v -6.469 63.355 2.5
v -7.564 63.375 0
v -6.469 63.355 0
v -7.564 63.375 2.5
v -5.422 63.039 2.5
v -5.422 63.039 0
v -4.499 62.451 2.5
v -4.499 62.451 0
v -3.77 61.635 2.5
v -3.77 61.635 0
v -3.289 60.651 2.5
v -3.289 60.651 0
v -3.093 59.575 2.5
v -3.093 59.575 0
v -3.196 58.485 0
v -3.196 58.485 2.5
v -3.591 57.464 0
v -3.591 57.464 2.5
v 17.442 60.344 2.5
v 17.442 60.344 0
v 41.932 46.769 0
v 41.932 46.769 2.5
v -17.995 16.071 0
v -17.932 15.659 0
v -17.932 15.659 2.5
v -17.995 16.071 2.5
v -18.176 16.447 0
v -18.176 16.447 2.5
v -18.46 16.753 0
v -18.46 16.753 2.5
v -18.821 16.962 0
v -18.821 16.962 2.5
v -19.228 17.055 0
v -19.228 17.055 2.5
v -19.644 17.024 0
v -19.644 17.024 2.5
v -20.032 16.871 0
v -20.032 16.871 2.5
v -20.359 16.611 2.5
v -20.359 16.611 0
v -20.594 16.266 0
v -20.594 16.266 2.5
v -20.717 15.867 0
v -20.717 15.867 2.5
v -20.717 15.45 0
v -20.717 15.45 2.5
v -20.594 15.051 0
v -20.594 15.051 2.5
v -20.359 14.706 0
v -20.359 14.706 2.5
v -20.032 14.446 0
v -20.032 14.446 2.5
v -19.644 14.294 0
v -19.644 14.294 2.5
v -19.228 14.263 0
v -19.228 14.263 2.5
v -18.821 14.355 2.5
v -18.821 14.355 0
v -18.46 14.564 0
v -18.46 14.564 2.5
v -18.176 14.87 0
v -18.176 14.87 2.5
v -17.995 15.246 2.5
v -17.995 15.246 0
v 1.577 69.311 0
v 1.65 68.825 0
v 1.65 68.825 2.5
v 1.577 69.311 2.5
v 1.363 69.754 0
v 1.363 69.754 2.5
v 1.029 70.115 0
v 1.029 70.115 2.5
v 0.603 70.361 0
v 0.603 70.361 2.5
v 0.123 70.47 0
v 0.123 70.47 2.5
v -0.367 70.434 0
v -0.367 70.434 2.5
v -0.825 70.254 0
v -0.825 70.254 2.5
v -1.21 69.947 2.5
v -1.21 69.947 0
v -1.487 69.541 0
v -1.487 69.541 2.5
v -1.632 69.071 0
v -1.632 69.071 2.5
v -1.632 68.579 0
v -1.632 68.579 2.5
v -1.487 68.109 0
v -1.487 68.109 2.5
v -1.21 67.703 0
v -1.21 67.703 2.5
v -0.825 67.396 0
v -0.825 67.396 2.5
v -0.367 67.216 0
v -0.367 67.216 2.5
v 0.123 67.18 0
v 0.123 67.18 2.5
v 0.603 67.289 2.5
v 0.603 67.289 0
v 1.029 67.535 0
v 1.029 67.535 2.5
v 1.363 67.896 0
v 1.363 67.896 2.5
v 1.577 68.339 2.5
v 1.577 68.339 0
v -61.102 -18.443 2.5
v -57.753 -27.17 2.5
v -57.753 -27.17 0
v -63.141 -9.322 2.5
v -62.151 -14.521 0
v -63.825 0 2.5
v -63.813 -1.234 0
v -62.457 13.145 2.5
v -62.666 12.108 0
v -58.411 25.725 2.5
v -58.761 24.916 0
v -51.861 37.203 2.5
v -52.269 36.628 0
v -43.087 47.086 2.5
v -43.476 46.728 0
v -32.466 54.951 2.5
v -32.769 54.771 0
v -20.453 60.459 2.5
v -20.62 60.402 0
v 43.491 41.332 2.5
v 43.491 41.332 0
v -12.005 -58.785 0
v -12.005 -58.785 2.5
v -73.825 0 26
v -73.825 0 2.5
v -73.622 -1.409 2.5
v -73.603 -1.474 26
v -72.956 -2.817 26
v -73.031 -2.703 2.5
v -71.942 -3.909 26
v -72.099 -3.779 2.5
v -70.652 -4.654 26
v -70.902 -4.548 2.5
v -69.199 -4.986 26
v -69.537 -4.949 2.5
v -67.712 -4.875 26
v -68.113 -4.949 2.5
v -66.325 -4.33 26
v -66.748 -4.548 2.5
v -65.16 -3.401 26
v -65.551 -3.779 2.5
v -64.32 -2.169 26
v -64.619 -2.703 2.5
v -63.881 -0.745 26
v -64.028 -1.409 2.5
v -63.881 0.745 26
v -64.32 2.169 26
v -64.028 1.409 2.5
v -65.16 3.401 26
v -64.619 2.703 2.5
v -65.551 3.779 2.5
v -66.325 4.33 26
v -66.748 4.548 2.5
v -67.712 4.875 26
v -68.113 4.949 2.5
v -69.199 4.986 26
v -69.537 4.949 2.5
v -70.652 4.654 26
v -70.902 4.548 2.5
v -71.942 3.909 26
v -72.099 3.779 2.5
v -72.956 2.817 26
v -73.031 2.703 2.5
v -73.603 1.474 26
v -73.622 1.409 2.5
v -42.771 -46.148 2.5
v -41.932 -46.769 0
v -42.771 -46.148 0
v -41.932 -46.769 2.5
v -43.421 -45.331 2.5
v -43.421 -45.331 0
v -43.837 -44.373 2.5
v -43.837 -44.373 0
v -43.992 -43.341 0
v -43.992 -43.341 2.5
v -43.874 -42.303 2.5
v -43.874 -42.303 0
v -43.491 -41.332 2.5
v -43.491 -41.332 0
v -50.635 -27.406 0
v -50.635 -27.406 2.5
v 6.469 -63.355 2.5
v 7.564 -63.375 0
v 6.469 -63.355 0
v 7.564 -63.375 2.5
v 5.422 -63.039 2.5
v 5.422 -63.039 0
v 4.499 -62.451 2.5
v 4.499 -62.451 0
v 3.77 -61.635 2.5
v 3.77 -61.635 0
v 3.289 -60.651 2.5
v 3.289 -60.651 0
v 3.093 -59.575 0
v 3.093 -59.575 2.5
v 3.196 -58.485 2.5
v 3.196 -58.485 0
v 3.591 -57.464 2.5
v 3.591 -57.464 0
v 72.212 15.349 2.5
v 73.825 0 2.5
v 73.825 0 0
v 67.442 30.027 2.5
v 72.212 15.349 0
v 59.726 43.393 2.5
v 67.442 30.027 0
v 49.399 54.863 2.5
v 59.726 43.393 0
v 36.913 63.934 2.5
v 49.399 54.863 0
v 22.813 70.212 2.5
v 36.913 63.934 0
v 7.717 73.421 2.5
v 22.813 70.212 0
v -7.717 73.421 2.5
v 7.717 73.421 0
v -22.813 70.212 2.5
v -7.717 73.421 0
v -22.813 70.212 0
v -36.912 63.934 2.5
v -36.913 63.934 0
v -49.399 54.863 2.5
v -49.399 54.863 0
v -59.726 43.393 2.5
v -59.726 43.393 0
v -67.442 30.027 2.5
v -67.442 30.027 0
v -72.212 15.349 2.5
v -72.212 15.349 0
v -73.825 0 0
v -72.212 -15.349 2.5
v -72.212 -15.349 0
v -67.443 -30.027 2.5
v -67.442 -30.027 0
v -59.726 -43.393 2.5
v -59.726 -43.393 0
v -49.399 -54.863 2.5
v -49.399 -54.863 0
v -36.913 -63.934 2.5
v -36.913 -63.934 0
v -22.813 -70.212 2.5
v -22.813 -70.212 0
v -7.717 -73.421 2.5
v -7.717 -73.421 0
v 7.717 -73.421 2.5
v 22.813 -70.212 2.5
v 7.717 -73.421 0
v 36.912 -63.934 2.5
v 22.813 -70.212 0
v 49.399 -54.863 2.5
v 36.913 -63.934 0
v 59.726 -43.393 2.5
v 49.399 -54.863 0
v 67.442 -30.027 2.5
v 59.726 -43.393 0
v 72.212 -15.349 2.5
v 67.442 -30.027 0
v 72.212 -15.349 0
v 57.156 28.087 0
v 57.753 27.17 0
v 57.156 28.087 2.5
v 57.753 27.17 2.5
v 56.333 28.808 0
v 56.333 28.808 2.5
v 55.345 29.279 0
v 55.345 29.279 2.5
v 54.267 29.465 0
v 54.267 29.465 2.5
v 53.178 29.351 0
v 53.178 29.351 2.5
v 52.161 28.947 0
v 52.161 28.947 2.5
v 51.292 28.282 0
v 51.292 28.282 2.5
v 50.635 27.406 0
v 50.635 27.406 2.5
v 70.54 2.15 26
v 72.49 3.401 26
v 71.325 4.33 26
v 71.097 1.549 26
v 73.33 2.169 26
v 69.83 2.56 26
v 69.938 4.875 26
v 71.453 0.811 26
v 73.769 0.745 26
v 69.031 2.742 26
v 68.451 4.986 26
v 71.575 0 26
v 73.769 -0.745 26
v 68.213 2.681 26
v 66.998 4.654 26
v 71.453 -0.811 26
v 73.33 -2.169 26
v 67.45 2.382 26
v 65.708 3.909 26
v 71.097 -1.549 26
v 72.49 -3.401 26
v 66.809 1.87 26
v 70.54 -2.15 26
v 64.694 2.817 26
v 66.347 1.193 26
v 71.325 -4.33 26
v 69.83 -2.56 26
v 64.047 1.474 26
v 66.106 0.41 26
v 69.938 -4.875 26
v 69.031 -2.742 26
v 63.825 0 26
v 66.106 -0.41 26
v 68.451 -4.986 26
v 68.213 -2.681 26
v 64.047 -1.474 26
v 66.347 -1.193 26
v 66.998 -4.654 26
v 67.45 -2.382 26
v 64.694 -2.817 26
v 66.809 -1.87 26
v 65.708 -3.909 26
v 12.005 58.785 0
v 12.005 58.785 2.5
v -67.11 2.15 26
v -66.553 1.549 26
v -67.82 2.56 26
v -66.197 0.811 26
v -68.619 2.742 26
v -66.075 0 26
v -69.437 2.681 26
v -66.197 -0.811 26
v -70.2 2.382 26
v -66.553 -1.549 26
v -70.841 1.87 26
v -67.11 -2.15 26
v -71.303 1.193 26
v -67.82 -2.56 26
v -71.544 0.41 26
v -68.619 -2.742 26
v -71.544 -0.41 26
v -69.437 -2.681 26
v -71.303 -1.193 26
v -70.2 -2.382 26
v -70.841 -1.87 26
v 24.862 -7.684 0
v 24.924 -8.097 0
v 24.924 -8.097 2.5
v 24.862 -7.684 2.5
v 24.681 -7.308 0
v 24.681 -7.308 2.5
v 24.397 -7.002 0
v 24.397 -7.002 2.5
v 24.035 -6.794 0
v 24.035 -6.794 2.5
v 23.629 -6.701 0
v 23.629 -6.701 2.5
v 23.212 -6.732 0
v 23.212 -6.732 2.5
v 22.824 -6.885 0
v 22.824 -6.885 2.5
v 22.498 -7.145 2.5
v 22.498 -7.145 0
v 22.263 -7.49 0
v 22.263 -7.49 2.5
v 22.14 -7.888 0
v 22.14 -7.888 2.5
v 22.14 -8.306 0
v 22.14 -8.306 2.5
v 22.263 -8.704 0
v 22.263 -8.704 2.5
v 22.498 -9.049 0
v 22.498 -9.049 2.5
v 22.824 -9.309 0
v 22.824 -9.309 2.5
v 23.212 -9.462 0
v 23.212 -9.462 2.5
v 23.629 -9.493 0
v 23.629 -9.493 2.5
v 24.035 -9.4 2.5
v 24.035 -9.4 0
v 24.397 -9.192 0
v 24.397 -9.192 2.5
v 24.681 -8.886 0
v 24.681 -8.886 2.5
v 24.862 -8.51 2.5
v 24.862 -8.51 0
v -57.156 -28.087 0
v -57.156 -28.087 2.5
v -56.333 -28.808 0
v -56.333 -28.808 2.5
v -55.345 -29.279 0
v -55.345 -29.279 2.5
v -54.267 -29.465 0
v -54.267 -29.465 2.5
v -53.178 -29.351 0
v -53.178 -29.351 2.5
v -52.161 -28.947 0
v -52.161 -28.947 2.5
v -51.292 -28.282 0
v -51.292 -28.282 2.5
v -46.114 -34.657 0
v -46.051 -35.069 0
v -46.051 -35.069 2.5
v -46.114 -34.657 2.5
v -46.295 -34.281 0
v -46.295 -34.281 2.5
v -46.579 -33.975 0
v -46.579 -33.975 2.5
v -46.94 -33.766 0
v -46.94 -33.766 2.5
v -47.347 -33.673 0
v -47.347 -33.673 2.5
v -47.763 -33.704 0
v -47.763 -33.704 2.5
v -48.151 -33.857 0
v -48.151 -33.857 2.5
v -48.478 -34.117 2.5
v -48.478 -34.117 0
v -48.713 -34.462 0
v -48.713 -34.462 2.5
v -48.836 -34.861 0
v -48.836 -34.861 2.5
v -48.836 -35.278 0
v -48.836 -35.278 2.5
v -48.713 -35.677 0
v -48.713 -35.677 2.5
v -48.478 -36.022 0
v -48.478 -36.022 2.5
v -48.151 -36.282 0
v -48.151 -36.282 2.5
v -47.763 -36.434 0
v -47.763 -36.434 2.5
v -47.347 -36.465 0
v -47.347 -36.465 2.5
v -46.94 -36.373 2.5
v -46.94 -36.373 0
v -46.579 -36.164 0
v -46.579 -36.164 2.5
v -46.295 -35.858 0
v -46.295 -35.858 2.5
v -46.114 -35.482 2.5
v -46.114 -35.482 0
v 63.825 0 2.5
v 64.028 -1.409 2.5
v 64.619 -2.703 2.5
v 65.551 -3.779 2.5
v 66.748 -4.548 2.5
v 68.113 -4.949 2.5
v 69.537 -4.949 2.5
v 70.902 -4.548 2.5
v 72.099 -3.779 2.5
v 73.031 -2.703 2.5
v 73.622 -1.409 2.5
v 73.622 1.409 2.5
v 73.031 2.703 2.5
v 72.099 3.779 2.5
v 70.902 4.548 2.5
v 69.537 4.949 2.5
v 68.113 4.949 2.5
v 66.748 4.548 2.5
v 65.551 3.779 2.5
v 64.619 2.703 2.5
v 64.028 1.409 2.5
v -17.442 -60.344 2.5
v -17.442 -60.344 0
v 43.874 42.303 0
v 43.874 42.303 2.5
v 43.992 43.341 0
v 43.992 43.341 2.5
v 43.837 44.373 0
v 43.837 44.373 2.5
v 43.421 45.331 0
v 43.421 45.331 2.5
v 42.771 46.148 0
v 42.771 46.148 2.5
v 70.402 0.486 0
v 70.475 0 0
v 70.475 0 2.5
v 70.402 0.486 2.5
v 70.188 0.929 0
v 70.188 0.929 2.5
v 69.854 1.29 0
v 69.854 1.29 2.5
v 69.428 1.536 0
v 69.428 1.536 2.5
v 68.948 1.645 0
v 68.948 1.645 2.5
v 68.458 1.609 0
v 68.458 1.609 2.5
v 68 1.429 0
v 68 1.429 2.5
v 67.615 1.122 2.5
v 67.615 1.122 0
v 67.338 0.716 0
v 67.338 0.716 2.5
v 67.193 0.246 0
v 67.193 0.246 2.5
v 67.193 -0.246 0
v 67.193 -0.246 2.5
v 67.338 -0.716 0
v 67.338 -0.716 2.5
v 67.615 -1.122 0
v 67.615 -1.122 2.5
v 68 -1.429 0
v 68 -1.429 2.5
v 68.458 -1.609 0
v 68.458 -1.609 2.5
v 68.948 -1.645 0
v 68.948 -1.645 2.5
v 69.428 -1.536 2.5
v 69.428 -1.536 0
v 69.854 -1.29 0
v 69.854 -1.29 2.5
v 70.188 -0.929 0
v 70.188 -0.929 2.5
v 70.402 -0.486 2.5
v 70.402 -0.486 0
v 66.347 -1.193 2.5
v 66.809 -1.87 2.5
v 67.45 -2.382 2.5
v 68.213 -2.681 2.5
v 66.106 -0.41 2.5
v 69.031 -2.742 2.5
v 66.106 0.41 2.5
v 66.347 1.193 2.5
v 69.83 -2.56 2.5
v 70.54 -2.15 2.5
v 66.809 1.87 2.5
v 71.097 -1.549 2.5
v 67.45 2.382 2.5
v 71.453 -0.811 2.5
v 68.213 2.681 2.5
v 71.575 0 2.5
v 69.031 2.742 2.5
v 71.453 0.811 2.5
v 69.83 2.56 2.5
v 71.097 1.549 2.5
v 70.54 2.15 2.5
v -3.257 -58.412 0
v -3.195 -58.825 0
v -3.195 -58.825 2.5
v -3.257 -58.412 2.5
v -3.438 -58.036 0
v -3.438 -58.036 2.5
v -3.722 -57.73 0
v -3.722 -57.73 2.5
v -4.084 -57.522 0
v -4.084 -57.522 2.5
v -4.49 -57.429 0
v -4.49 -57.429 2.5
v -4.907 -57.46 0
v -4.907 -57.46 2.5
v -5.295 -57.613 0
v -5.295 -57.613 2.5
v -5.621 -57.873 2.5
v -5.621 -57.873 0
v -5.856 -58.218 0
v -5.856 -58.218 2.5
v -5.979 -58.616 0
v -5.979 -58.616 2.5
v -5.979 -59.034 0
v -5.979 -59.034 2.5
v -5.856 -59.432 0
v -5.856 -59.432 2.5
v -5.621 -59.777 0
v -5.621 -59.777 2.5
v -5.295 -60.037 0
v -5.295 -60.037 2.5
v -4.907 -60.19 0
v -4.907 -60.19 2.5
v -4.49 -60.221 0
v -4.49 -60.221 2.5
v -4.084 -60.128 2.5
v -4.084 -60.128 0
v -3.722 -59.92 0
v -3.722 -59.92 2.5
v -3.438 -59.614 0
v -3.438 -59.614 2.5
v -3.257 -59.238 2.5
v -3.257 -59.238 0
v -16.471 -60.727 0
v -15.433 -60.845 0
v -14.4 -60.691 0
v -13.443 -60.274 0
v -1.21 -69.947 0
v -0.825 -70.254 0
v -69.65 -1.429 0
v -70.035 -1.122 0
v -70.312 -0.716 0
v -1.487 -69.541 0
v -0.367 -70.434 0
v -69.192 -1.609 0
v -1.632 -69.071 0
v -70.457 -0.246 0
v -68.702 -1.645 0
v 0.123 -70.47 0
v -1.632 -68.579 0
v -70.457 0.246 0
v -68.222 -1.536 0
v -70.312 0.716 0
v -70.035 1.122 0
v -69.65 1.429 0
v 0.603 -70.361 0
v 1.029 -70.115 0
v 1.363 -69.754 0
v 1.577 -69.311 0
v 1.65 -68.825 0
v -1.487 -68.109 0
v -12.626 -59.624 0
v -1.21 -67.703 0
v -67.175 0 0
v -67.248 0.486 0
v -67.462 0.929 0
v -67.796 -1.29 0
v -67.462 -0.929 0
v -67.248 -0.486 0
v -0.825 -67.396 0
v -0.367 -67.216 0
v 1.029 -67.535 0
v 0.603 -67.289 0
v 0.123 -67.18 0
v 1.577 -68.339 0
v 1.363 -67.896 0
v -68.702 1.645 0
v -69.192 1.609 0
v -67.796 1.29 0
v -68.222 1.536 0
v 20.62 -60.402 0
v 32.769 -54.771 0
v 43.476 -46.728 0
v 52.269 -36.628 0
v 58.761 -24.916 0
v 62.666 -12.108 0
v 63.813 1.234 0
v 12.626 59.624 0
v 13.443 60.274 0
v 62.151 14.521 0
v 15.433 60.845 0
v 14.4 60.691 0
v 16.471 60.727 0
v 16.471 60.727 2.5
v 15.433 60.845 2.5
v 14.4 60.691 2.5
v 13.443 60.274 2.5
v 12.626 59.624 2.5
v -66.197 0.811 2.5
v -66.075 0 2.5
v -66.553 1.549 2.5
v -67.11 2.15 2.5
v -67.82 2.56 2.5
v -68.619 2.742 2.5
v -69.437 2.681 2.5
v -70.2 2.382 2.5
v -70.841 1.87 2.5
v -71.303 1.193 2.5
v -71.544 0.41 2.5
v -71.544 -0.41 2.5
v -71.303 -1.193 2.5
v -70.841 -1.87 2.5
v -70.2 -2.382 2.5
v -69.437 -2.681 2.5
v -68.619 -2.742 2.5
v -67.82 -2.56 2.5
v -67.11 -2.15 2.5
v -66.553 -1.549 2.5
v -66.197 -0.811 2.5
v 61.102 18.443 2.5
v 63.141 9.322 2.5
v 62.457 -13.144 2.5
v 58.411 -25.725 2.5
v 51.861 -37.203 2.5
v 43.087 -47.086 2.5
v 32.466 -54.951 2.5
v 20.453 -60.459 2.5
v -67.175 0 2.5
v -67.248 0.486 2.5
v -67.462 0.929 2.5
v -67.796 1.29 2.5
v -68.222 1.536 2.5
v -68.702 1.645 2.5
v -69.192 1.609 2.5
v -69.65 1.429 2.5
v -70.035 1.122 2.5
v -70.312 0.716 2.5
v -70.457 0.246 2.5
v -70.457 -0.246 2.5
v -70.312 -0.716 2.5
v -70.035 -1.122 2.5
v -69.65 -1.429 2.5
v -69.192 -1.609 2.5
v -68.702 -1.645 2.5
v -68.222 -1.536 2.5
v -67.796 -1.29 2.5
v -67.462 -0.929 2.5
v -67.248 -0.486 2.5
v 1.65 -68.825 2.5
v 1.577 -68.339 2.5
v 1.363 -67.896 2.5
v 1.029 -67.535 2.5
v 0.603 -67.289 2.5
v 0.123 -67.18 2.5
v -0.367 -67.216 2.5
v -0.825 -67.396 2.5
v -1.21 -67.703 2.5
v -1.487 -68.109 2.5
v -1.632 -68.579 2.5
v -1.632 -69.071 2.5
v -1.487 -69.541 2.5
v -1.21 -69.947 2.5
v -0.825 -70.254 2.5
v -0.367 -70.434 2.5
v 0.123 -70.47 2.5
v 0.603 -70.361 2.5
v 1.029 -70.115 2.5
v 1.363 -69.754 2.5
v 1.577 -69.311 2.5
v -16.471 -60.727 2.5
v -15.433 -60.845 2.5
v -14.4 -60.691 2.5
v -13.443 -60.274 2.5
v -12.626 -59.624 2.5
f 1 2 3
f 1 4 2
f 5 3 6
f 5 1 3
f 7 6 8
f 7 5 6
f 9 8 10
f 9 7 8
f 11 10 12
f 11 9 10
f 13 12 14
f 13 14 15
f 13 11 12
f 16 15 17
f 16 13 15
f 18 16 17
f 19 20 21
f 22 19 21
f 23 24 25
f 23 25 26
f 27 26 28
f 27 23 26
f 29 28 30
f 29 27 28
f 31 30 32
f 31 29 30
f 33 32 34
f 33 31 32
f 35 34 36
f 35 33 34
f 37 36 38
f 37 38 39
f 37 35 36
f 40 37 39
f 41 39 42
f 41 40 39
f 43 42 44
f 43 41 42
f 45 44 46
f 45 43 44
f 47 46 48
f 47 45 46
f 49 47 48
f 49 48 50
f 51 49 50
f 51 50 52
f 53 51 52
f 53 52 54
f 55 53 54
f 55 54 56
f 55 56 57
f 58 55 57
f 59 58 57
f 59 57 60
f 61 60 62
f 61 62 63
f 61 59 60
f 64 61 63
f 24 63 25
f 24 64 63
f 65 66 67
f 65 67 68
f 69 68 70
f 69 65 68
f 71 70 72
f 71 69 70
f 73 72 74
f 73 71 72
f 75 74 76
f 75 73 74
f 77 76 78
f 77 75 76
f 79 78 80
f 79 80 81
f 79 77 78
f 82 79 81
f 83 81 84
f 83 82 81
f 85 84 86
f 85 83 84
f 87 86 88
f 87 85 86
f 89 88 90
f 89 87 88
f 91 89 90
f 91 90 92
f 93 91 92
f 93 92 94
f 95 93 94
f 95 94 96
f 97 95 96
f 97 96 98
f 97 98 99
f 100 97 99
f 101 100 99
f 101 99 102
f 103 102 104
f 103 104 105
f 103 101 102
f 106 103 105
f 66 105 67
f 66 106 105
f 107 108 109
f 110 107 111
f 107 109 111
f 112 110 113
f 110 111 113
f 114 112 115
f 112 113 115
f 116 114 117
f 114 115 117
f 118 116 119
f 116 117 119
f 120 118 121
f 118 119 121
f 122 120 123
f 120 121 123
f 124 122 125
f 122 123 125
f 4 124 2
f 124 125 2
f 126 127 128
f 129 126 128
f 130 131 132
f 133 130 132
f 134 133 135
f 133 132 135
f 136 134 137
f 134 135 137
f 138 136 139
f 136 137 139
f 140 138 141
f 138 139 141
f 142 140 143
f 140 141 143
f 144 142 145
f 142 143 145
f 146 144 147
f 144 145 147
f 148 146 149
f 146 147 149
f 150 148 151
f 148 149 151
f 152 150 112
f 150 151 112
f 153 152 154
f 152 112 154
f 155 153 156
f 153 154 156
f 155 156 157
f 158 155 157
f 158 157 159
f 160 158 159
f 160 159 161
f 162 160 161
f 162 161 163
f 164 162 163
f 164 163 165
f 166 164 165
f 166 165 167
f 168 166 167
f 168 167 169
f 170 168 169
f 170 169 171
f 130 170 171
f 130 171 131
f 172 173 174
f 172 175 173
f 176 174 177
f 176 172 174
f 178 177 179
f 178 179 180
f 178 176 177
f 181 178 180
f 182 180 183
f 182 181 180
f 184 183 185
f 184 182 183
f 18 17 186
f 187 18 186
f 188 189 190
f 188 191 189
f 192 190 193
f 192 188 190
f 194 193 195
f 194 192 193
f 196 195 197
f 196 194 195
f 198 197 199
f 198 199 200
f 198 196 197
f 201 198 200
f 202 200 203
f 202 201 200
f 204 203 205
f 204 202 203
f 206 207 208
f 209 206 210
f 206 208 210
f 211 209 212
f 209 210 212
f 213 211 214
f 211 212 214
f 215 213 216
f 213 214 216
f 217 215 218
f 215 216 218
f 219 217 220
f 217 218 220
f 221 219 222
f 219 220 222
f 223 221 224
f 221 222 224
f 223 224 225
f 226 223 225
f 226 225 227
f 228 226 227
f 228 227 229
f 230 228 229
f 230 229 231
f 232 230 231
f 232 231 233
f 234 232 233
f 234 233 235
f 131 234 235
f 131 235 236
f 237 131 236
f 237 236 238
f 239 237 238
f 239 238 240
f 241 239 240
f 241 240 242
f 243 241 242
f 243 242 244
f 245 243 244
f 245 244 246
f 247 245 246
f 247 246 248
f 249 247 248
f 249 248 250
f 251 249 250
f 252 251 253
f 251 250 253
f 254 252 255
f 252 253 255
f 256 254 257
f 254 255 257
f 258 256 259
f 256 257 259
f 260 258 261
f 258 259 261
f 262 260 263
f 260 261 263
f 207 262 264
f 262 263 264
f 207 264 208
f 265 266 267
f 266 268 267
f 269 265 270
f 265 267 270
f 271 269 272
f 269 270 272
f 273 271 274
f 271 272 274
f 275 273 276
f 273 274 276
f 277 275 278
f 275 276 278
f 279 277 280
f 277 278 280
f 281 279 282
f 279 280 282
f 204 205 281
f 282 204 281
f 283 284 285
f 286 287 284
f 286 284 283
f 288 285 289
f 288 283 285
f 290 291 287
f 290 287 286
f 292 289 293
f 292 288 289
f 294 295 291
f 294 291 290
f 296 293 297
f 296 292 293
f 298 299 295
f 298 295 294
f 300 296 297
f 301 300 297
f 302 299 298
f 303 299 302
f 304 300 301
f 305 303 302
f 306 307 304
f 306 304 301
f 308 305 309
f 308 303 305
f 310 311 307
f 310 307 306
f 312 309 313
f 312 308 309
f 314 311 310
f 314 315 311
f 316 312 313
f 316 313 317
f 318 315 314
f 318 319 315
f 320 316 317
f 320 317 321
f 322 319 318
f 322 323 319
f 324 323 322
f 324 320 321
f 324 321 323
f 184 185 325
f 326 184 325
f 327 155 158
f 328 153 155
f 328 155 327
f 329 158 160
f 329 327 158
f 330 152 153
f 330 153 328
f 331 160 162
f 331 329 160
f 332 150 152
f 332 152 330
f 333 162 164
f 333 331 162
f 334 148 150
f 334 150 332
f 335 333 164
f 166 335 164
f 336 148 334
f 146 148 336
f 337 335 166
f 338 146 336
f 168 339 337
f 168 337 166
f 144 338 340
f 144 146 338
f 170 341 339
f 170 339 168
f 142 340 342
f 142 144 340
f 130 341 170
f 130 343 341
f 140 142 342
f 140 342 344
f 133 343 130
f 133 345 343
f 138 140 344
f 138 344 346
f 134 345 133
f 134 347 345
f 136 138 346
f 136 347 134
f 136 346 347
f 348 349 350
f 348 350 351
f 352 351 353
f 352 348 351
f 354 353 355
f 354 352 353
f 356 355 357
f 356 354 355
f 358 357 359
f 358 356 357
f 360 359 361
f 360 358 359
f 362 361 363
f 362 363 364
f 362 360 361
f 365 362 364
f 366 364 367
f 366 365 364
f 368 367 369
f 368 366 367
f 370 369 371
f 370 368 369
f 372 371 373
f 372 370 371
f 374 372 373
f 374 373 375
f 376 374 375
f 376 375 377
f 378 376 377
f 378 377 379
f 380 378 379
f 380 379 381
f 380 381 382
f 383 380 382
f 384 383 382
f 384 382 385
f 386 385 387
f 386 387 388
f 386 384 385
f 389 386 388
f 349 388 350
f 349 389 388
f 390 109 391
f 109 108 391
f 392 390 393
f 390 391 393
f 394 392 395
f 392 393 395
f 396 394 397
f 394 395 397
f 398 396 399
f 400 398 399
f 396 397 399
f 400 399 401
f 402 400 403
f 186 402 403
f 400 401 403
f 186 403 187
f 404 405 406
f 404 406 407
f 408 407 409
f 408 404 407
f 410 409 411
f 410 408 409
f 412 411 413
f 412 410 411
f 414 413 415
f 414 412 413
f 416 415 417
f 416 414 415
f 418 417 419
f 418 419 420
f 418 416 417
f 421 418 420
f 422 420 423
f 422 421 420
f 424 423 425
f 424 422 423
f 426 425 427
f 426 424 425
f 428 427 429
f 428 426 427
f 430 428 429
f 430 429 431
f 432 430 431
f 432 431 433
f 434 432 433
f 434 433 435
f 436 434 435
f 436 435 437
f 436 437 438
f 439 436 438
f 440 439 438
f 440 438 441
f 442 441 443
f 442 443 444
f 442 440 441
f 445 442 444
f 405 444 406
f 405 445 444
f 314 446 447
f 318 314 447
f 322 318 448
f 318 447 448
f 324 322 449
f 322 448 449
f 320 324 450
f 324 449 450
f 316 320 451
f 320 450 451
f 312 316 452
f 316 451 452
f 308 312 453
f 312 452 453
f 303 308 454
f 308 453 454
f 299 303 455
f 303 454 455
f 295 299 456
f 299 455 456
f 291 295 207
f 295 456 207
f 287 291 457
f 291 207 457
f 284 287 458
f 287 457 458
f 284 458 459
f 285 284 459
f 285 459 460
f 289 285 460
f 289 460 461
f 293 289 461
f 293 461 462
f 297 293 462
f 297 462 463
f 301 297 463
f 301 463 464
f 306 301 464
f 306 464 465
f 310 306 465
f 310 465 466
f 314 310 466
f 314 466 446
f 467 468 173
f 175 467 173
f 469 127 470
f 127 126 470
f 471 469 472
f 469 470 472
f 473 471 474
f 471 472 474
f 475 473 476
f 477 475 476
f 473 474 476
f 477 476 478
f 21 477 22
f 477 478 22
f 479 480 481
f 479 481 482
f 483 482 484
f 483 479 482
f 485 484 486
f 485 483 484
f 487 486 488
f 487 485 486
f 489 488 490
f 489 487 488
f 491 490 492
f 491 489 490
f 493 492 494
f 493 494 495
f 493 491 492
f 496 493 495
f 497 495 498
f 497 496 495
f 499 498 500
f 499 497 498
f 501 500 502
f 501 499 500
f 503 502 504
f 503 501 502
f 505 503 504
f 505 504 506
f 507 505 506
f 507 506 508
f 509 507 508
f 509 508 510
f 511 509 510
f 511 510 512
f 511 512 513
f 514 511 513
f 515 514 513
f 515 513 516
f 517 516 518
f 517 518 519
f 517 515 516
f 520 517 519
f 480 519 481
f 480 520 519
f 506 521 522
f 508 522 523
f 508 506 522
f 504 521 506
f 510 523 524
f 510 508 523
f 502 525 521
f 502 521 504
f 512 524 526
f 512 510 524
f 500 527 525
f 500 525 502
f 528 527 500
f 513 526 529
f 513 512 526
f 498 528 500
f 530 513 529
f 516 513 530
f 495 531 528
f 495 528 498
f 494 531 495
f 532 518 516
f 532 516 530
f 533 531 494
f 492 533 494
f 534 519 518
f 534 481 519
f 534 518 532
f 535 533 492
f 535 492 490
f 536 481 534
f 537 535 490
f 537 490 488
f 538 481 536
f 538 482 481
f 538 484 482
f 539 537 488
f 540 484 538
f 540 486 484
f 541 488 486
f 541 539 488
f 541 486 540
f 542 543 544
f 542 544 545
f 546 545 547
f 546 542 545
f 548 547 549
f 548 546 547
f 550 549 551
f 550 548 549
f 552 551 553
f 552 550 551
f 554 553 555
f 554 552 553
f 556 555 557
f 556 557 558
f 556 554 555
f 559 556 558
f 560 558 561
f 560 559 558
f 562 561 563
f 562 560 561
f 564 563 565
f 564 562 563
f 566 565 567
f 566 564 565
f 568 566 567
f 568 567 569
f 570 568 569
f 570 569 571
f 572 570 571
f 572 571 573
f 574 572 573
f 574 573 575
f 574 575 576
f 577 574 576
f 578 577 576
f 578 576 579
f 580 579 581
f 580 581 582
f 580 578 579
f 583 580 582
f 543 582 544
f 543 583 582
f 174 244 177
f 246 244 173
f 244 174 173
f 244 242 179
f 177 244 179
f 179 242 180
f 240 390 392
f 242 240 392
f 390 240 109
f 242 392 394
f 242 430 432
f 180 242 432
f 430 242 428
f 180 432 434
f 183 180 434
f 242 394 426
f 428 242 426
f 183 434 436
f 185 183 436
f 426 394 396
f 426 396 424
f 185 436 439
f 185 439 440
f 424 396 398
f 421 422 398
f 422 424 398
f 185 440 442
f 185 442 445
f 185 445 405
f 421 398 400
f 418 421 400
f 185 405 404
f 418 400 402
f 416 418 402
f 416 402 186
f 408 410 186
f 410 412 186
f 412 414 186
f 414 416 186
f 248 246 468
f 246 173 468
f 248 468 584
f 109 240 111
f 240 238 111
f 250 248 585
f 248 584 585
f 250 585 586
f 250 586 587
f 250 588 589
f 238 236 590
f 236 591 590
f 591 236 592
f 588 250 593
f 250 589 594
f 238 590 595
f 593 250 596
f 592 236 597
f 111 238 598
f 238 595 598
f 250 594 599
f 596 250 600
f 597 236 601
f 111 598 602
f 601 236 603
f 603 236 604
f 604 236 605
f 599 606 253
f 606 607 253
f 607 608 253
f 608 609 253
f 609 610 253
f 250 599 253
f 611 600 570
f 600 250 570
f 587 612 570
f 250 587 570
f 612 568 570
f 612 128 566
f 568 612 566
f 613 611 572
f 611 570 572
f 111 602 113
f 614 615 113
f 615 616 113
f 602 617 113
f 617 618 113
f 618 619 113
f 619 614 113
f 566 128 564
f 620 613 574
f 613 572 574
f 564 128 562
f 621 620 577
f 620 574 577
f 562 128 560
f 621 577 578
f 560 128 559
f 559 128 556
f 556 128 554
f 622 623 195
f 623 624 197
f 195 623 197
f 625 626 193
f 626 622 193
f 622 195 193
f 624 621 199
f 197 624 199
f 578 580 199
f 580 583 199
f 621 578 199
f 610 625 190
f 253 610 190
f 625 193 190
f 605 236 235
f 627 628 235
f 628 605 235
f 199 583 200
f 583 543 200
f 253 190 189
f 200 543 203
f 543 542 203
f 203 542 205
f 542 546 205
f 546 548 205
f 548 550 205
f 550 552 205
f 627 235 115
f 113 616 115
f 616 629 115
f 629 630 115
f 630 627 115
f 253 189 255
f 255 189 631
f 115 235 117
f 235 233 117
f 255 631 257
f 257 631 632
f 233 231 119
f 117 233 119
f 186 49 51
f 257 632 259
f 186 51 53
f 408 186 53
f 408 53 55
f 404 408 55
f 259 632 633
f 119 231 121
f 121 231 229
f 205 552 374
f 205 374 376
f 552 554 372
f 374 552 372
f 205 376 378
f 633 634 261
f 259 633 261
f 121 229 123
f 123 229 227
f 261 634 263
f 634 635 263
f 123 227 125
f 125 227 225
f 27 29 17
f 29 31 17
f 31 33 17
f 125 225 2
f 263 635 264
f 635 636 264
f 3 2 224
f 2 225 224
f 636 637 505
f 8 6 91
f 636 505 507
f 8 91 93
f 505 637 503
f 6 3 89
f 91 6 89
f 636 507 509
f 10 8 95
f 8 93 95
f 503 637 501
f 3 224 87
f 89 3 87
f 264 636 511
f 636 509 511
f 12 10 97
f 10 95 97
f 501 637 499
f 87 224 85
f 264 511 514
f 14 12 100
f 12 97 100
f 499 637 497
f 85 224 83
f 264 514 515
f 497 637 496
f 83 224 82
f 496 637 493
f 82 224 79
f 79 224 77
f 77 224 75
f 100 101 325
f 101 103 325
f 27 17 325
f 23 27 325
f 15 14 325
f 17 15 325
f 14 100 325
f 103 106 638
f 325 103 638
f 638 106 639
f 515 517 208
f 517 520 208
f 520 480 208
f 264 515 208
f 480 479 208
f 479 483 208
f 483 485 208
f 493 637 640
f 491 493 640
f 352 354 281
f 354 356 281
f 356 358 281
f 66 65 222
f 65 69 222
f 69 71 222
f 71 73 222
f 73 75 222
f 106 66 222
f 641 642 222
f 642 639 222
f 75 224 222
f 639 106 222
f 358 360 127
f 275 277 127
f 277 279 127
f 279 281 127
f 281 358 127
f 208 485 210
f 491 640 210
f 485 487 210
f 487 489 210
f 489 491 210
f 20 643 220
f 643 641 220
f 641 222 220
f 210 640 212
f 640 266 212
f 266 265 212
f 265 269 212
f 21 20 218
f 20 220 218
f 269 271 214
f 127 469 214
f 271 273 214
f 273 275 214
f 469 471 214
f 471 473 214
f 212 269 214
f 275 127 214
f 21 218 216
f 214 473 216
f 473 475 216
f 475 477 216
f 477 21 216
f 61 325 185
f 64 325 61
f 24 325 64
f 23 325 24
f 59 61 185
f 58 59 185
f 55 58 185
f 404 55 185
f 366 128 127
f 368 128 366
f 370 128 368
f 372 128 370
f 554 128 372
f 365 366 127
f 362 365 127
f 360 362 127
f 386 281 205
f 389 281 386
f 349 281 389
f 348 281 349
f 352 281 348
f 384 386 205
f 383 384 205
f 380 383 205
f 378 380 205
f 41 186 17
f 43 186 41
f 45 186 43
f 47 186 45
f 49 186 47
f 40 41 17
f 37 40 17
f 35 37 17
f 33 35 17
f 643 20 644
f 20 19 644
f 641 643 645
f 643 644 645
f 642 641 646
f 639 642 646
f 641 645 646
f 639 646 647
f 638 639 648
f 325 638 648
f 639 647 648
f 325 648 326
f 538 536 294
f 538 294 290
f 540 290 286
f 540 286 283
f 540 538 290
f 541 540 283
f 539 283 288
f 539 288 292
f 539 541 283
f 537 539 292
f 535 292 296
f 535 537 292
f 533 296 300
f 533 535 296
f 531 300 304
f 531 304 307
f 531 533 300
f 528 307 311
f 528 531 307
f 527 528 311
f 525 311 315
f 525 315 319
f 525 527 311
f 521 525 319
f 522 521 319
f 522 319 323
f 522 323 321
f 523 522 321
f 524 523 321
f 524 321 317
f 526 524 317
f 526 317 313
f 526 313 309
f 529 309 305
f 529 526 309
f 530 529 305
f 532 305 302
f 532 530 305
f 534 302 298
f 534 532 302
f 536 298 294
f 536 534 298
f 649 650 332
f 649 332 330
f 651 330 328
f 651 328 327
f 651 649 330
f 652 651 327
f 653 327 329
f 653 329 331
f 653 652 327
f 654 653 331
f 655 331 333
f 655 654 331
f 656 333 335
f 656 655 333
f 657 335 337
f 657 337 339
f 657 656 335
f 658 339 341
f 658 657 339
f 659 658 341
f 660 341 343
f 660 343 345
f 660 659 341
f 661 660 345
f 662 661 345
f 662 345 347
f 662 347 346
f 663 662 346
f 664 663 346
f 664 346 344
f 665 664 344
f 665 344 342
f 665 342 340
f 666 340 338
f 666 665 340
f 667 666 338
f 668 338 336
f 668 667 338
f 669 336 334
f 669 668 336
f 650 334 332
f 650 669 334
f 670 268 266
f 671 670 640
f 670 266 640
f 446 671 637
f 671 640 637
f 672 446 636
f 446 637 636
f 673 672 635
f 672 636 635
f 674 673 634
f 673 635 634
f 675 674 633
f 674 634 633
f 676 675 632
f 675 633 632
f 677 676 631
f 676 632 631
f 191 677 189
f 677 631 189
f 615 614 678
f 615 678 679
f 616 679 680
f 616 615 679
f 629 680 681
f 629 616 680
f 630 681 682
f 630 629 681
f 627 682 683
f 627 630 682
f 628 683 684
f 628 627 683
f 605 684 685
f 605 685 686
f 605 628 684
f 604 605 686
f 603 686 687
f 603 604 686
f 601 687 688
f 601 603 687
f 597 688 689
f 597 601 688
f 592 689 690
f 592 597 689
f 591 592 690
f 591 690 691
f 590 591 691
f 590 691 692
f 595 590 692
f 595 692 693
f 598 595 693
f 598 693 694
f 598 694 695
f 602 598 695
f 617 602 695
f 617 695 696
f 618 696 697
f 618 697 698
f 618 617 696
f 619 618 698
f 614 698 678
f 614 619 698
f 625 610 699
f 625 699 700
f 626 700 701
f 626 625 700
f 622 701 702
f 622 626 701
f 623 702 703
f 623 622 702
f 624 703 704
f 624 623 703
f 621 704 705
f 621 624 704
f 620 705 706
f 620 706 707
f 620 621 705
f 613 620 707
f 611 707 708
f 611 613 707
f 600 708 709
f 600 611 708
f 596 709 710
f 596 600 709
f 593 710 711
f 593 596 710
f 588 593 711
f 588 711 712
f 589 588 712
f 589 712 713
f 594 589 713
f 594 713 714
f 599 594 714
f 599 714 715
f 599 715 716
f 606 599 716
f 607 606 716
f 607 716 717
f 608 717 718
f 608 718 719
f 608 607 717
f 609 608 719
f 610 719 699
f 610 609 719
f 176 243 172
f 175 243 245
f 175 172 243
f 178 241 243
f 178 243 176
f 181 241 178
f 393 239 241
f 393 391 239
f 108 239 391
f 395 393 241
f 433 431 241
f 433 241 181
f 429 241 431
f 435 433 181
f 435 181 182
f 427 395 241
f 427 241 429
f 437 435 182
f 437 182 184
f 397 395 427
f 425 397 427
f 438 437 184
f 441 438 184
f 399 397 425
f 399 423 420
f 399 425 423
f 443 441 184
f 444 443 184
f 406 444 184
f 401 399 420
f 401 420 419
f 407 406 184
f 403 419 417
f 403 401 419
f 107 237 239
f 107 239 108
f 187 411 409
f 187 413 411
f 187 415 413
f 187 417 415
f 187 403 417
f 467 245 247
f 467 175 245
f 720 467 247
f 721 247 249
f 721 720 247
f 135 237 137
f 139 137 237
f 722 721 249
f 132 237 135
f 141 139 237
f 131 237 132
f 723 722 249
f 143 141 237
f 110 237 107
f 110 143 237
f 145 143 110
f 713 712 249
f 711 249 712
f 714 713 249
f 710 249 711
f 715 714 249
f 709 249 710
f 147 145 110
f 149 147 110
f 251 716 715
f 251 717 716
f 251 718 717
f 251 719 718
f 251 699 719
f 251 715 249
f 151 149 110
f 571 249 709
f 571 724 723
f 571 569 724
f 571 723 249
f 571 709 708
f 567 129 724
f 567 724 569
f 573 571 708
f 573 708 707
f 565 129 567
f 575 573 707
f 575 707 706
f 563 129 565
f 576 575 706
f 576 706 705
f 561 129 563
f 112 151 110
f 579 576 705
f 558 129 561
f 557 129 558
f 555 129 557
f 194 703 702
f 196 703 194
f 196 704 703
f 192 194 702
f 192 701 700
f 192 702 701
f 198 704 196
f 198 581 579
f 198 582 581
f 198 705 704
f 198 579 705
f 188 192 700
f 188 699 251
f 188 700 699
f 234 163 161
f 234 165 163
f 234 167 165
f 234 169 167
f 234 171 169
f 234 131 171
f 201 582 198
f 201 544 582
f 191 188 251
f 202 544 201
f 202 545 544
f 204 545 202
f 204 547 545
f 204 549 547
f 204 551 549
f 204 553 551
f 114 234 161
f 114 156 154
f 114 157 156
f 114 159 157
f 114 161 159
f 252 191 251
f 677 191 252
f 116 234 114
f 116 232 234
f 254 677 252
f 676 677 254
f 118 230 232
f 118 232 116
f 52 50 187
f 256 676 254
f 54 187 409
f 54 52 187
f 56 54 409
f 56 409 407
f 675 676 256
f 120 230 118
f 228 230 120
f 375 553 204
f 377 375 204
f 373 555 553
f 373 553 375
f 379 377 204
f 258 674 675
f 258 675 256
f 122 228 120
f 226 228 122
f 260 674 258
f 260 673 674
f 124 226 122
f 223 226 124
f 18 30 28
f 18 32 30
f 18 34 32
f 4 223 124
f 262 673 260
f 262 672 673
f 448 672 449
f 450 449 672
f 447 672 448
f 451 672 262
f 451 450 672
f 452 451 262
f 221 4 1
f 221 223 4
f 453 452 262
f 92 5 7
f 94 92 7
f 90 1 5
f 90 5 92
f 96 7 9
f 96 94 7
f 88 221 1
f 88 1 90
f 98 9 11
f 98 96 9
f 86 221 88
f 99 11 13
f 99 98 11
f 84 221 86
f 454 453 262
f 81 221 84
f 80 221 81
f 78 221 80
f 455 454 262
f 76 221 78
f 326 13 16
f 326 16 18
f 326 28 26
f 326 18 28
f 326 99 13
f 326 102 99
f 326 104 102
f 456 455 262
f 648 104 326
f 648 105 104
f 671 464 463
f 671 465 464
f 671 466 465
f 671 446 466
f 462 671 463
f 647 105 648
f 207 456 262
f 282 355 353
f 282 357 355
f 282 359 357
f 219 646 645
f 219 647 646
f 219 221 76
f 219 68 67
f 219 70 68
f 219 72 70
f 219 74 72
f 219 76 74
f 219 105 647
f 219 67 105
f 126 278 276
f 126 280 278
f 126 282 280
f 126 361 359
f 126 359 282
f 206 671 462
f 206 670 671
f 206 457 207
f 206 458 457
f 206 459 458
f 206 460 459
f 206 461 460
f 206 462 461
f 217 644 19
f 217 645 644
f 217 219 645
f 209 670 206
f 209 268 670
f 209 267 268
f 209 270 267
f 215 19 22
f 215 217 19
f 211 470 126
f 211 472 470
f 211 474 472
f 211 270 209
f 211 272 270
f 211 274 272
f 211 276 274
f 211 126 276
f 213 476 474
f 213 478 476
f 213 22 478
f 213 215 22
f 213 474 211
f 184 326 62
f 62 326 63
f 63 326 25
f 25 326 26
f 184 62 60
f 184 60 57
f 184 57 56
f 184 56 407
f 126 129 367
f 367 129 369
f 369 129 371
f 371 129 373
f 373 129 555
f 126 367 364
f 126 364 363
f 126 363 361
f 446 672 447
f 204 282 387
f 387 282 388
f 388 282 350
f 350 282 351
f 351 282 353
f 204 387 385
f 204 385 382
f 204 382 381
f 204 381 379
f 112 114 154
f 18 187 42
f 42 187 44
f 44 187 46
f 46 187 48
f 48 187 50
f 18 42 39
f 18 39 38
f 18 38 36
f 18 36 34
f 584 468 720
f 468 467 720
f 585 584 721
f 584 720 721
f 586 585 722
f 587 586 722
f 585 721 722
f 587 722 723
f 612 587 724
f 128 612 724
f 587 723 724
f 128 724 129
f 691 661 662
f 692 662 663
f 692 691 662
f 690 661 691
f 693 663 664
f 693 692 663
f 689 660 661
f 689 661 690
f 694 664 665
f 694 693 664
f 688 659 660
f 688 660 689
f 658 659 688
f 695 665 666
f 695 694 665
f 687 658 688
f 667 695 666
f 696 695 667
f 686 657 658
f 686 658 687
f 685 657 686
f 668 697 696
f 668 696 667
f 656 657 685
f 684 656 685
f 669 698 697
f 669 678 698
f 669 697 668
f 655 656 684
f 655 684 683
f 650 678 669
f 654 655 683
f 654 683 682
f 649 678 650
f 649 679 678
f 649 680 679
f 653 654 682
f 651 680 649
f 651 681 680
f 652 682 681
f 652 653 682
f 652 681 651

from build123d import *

# Parameters (mm, degrees)
SKETCH1_R           = 73.825
SKETCH1_R_2         = 1.65
SKETCH1_R_3         = 1.4
BOSS_EXTRUDE1_DEPTH = 2.5
FILLET1_R           = 4
SKETCH2_R           = 5
SKETCH2_R_2         = 2.75
BOSS_EXTRUDE2_DEPTH = 23.5


with BuildPart() as part:
    # Sketch1 → Boss-Extrude1 (new body)
    with BuildSketch(Plane.XY):
        Circle(SKETCH1_R)
        with Locations((0, 68.825)):
            Circle(SKETCH1_R_2, mode=Mode.SUBTRACT)
        with Locations((68.825, 0)):
            Circle(SKETCH1_R_2, mode=Mode.SUBTRACT)
        with Locations((0, -68.825)):
            Circle(SKETCH1_R_2, mode=Mode.SUBTRACT)
        with Locations((-68.825, 0)):
            Circle(SKETCH1_R_2, mode=Mode.SUBTRACT)
        with Locations((-4.595036818, -58.824966678)):
            Circle(SKETCH1_R_3, mode=Mode.SUBTRACT)
        with Locations((-47.451402468, -35.069295286)):
            Circle(SKETCH1_R_3, mode=Mode.SUBTRACT)
        with Locations((-19.332444494, 15.658647728)):
            Circle(SKETCH1_R_3, mode=Mode.SUBTRACT)
        with Locations((23.523921156, -8.097023664)):
            Circle(SKETCH1_R_3, mode=Mode.SUBTRACT)
        with BuildLine():
            Line((-0.065219366, 63.824966678), (-54.161202477, -33.766770223))
            ThreePointArc((-54.161202477, -33.766770223), (-55.822602808, 30.942974012), (-0.065219366, 63.824966678))
        make_face(mode=Mode.SUBTRACT)
        with BuildLine():
            Line((0.065219366, -63.824966678), (54.161202477, 33.766770223))
            ThreePointArc((54.161202477, 33.766770223), (55.822602808, -30.942974012), (0.065219366, -63.824966678))
        make_face(mode=Mode.SUBTRACT)
        Polygon((-45.430097338, -44.830089012), (13.943787881, 62.283235341), (45.430097338, 44.830089012), (-13.943787881, -62.283235341), align=None, mode=Mode.SUBTRACT)
    extrude(amount=BOSS_EXTRUDE1_DEPTH)

    # Fillet1
    fillet1_edges = [part.edges().sort_by_distance(p)[0] for p in [
        (-0.065219366, 63.824966678, 1.25),
        (-54.161202477, -33.766770223, 1.25),
        (-45.430097338, -44.830089012, 1.25),
        (-13.943787881, -62.283235341, 1.25),
        (45.430097338, 44.830089012, 1.25),
        (13.943787881, 62.283235341, 1.25),
        (54.161202477, 33.766770223, 1.25),
        (0.065219366, -63.824966678, 1.25),
    ]]
    fillet(fillet1_edges, radius=FILLET1_R)

    # Sketch2 → Boss-Extrude2 (add)
    # profile 1 of 2: a face of its own
    with BuildSketch(Plane.XY.offset(2.5)):
        with Locations(Location((-68.825, 0, 0), (0, 0, 179.99962476))):
            Circle(SKETCH2_R)
        with Locations((-68.825, 0)):
            Circle(SKETCH2_R_2, mode=Mode.SUBTRACT)
    # profile 2 of 2: a face of its own
    with BuildSketch(Plane.XY.offset(2.5)):
        with Locations(Location((68.825, 0, 0), (0, 0, 179.999650978))):
            Circle(SKETCH2_R)
        with Locations((68.825, 0)):
            Circle(SKETCH2_R_2, mode=Mode.SUBTRACT)
    extrude(amount=BOSS_EXTRUDE2_DEPTH)


solid = part.part
